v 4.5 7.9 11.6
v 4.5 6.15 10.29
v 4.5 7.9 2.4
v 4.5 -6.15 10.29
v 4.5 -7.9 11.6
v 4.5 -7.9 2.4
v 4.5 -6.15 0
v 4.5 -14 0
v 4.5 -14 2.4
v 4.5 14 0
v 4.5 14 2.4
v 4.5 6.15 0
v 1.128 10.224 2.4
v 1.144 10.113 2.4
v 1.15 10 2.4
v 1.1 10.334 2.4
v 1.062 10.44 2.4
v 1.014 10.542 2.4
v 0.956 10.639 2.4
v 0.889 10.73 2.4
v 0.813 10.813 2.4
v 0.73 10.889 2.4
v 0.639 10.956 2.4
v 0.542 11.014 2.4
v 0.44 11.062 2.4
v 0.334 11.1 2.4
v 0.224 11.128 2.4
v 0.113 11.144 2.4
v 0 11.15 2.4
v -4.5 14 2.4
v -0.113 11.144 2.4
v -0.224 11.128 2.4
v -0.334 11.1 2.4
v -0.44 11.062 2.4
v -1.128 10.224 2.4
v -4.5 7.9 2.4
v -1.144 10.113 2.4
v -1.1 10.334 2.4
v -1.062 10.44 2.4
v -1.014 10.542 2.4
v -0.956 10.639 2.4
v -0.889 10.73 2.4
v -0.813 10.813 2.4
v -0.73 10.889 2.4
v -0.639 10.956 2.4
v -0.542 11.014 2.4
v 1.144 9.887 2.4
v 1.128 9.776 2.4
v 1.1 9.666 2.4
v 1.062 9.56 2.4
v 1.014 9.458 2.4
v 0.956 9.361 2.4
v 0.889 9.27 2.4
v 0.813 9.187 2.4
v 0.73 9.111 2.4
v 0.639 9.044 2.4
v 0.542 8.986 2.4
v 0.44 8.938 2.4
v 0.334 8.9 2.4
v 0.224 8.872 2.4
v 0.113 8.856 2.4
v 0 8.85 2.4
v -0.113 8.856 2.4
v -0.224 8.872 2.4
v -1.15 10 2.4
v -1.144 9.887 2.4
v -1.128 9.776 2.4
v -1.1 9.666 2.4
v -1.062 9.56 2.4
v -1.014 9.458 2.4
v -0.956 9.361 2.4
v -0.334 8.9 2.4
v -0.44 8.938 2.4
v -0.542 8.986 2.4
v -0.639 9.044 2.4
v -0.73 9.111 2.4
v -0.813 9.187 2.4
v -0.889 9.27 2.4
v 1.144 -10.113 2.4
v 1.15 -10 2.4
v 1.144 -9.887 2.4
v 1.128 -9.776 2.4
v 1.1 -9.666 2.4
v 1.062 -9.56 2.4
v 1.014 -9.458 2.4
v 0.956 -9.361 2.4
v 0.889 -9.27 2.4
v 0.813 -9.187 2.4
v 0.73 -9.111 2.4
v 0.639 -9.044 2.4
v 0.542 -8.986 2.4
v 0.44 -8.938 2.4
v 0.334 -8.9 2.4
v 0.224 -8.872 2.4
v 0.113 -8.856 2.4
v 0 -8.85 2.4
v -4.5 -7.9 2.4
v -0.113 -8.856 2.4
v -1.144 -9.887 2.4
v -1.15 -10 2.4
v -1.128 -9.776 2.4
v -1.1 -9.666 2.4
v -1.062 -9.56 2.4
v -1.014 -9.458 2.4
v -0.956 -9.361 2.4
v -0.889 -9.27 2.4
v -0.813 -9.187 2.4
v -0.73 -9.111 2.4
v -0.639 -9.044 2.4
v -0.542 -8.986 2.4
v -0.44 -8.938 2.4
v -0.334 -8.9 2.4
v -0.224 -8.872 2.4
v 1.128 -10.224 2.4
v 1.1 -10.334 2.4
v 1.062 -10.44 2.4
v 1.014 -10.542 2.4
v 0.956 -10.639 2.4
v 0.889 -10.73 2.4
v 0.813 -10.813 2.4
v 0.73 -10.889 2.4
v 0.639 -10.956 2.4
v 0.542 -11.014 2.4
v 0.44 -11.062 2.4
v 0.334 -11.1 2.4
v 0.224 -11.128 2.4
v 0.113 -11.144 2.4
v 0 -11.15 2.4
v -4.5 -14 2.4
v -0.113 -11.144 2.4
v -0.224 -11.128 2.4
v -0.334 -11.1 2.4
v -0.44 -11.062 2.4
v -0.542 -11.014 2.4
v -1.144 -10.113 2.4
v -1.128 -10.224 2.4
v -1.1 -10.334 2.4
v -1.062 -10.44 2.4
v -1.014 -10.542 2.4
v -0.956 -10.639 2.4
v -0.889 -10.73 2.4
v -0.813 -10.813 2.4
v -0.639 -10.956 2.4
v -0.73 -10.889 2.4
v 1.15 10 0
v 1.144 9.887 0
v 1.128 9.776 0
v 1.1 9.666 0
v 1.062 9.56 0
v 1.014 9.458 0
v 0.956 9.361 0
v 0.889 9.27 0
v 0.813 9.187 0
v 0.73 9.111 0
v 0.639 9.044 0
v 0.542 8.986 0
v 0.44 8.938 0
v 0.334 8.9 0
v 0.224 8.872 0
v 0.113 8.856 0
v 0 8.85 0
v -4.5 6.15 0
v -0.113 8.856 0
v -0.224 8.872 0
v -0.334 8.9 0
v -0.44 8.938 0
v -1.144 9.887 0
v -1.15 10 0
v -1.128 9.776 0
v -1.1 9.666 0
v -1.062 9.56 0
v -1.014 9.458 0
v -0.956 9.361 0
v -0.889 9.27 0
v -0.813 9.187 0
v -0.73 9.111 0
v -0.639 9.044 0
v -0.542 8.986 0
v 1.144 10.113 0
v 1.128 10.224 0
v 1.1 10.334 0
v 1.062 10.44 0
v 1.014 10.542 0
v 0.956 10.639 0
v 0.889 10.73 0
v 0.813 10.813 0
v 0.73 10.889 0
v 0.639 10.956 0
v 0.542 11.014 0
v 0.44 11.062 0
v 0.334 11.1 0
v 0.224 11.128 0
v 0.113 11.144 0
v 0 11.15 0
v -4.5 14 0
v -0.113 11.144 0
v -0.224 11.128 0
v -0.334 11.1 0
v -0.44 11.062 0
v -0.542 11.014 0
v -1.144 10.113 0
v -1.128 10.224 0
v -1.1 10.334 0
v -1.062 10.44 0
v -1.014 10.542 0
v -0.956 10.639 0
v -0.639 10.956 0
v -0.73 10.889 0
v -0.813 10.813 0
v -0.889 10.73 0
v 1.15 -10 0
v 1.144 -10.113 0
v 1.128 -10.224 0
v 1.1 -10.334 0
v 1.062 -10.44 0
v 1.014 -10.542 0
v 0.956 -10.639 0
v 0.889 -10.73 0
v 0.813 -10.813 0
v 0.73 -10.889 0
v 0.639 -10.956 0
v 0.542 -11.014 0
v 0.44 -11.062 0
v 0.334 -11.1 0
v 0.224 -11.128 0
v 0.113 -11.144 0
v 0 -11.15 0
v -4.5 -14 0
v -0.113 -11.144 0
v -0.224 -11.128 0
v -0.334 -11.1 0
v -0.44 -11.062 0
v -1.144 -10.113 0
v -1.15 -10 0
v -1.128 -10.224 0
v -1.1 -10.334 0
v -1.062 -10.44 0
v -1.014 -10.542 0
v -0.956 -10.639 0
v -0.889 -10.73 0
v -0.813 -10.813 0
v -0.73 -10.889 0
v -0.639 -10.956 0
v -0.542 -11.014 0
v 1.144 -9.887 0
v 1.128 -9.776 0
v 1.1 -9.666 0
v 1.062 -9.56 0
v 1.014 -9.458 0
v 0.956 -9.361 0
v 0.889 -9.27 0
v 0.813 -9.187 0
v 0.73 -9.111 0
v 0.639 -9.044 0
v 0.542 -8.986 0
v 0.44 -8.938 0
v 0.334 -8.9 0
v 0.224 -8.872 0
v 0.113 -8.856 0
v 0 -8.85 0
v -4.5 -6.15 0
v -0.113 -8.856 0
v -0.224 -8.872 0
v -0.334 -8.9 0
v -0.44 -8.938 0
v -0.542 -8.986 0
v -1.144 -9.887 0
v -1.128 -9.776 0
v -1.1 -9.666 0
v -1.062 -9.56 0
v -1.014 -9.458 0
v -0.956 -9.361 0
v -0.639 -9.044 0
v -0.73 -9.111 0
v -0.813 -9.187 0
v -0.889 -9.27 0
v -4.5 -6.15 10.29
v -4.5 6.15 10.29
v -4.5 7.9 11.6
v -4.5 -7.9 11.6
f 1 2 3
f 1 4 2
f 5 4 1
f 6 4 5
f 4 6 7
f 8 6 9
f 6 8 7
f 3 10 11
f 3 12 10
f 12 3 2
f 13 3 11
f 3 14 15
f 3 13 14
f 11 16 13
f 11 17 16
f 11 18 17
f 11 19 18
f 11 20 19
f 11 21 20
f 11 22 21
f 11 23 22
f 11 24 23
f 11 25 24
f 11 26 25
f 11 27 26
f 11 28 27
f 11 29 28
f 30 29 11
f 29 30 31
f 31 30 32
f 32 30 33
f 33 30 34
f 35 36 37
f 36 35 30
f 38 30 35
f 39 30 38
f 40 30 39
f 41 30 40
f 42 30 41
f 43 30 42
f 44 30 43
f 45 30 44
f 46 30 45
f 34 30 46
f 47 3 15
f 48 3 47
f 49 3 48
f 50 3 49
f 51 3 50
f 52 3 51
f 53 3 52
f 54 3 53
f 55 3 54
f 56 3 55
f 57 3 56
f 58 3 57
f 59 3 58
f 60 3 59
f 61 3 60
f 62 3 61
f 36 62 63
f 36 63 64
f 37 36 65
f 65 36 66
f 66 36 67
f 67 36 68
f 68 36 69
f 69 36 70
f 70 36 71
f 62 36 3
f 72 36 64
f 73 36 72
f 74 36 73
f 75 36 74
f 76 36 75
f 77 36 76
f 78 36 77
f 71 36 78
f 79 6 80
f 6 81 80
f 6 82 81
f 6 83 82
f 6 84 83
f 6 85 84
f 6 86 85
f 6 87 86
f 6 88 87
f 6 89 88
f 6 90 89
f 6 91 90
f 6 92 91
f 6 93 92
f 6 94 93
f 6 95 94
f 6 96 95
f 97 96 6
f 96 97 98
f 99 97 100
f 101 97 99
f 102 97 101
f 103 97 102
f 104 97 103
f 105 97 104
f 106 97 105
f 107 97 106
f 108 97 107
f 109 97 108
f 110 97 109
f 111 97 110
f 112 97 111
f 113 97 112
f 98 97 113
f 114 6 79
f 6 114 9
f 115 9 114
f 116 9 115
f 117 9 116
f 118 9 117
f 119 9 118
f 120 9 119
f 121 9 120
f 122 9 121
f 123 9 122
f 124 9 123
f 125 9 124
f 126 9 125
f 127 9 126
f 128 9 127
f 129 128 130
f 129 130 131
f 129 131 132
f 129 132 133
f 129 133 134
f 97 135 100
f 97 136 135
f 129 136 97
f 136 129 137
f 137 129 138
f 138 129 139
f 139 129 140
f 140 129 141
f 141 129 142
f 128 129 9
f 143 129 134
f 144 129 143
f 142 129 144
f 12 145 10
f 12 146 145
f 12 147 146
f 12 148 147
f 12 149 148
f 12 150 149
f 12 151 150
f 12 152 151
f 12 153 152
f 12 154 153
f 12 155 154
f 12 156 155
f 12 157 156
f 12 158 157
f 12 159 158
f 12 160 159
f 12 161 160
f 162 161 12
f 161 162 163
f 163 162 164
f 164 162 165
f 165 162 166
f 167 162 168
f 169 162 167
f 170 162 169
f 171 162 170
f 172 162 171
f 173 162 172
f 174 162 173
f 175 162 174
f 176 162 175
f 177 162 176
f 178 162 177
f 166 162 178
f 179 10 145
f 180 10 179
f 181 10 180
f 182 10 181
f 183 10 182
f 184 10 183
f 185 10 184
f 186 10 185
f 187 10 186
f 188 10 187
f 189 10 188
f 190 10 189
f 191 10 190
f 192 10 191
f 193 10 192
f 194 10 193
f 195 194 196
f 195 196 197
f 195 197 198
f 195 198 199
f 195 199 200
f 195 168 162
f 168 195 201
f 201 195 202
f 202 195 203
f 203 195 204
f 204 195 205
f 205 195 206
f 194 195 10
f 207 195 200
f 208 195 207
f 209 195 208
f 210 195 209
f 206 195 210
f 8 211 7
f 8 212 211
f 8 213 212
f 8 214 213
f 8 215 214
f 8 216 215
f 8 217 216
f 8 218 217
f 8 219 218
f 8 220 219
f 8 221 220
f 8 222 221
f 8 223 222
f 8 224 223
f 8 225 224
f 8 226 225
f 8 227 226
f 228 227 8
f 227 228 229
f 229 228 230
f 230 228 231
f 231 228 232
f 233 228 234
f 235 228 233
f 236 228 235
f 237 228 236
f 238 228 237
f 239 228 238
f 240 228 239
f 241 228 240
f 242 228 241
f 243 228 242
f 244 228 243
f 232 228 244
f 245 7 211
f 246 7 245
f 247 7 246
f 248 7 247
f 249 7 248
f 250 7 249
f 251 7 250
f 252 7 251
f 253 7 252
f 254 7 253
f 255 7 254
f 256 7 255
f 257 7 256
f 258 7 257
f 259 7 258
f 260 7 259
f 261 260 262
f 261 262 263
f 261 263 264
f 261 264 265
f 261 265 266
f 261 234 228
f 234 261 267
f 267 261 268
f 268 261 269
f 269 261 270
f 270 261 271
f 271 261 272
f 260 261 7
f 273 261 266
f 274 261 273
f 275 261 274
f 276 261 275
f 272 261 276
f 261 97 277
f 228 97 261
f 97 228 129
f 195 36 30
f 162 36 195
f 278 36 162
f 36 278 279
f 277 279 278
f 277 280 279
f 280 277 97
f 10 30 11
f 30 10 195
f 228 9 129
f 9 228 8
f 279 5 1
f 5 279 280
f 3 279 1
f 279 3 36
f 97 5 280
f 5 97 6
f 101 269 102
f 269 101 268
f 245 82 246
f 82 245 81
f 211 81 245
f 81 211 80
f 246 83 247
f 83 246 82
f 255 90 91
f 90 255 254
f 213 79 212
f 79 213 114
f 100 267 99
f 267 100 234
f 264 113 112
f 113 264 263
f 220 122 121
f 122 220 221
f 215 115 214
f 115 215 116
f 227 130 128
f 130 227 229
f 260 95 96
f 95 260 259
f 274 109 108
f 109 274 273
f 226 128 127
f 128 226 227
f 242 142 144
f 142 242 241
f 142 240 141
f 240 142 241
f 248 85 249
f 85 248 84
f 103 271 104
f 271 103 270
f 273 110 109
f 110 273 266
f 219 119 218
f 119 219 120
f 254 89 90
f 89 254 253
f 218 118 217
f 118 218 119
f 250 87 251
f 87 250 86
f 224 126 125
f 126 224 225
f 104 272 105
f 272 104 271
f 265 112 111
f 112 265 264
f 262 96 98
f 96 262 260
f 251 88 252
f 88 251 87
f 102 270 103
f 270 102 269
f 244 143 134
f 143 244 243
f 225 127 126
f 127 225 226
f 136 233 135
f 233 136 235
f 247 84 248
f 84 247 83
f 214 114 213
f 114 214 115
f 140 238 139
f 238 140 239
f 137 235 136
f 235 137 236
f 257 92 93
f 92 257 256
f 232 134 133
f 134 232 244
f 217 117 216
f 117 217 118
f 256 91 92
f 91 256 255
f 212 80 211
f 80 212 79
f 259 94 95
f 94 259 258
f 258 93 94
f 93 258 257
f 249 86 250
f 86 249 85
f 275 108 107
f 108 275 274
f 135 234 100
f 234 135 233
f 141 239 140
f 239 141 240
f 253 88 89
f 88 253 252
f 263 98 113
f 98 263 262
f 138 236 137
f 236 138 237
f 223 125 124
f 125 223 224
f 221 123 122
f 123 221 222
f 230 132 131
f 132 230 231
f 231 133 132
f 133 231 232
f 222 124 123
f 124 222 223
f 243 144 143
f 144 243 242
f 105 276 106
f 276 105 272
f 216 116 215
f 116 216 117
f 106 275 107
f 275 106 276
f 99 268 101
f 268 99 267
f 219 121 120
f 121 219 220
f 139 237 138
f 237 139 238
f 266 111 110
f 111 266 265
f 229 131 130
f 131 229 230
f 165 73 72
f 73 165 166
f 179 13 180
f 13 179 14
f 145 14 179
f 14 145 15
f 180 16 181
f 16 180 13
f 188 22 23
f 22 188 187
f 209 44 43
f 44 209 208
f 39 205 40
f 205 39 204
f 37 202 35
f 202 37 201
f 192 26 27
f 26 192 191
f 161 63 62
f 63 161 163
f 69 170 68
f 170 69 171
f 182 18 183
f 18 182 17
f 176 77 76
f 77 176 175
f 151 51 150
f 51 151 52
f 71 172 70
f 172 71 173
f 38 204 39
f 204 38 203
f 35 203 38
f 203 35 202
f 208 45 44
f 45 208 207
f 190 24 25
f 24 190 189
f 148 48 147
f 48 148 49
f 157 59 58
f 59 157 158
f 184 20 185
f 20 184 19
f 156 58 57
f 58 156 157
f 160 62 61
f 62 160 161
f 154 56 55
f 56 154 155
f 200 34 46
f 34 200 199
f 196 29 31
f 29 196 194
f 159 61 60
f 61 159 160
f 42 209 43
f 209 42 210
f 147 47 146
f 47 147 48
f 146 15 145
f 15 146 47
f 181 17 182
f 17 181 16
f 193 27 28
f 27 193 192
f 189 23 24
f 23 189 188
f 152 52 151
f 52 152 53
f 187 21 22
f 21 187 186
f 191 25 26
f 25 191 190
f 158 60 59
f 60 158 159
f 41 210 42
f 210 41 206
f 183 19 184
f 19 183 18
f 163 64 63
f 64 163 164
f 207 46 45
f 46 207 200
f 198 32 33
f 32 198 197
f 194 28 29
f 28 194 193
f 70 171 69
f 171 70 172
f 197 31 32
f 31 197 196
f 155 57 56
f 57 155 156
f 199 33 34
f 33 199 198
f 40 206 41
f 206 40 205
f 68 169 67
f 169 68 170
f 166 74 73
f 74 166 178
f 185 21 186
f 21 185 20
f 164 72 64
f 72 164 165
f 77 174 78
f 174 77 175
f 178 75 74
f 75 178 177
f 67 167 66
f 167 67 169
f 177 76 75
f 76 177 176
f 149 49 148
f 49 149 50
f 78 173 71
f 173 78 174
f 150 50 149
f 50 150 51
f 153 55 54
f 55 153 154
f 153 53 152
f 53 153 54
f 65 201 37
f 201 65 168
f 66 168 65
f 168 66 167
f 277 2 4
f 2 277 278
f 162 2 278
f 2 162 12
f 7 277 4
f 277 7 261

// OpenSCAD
// PROVISIONAL FIT STUDY — dimensions in mm. Not validated for assembly.
// Select a part, render with F6, export STL after measured fit approval.
part = "motor_clamp"; // motor_clamp, battery_cradle, camera_bracket
$fn=64;
fit=0.3;
motor_width=12; motor_height=10; // motor roll orientation must be measured
clamp_axial_length=9;
clamp_hole_pitch=20; // actual PCB paired M2 holes, tangential spacing
motor_center_above_pcb=5; // provisional: terminal height is NOT established
pcb_thickness=1.6;
bolt_clearance=2.3;
battery=[55,35,10]; // pack envelope from existing project, unselected
wall=1.6; floor=1.6;
camera_board=[32,32,2]; // PLACEHOLDER: measure exact Waveshare PCB
camera_lens_diameter=14; // PLACEHOLDER: measure optical barrel

module motor_clamp(){
 // Saddle centered at radius 34 mm; ears align with existing PCB holes.
 // M2 through-bolts with washers and metal nuts below PCB; length selected
 // after motor vertical datum is measured. No reliance on solder for load.
 difference(){
  union(){
   translate([-clamp_axial_length/2,-14,0])cube([clamp_axial_length,28,2.4]);
   translate([-clamp_axial_length/2,-(motor_width/2+wall+fit),0])
    cube([clamp_axial_length,motor_width+2*(wall+fit),motor_center_above_pcb+motor_height/2+wall]);
  }
  translate([-clamp_axial_length,-(motor_width+fit)/2,-.01])
   cube([2*clamp_axial_length,motor_width+fit,motor_center_above_pcb+motor_height/2+fit]);
  for(y=[-clamp_hole_pitch/2,clamp_hole_pitch/2])
   translate([0,y,-.1])cylinder(h=20,d=bolt_clearance);
 }
}
module battery_cradle(){
 // Bottom tray with open ends, soft liner and two hook-and-loop straps.
 // Floating study: attachment to accessory holes is not yet collision checked.
 difference(){
  union(){
   cube([battery[0]+2*wall,battery[1]+2*wall,floor]);
   for(y=[0,battery[1]+wall])translate([0,y,0])
    cube([battery[0]+2*wall,wall,6]);
  }
  for(x=[10,battery[0]-6])for(y=[3,battery[1]-1])
   translate([x,y,-.1])cube([6,2.5,floor+.2]);
 }
}
module camera_bracket(){
 // Slotted universal backplate. M2 standoffs require actual hole pattern.
 // Lens window is a clearance study, not a verified field-of-view aperture.
 difference(){
  union(){cube([40,16,2.4]);translate([0,13.6,0])cube([40,2.4,40]);}
  for(x=[7,33])hull(){
   translate([x,5,-.1])cylinder(h=3,d=bolt_clearance);
   translate([x,10,-.1])cylinder(h=3,d=bolt_clearance);
  }
  translate([20,17,23])rotate([90,0,0])cylinder(h=5,d=camera_lens_diameter+2);
  for(x=[6,34])for(z=[10,34])hull(){
   translate([x,17,z-2])rotate([90,0,0])cylinder(h=5,d=bolt_clearance);
   translate([x,17,z+2])rotate([90,0,0])cylinder(h=5,d=bolt_clearance);
  }
 }
}
if(part=="motor_clamp")motor_clamp();
else if(part=="battery_cradle")battery_cradle();
else if(part=="camera_bracket")camera_bracket();
